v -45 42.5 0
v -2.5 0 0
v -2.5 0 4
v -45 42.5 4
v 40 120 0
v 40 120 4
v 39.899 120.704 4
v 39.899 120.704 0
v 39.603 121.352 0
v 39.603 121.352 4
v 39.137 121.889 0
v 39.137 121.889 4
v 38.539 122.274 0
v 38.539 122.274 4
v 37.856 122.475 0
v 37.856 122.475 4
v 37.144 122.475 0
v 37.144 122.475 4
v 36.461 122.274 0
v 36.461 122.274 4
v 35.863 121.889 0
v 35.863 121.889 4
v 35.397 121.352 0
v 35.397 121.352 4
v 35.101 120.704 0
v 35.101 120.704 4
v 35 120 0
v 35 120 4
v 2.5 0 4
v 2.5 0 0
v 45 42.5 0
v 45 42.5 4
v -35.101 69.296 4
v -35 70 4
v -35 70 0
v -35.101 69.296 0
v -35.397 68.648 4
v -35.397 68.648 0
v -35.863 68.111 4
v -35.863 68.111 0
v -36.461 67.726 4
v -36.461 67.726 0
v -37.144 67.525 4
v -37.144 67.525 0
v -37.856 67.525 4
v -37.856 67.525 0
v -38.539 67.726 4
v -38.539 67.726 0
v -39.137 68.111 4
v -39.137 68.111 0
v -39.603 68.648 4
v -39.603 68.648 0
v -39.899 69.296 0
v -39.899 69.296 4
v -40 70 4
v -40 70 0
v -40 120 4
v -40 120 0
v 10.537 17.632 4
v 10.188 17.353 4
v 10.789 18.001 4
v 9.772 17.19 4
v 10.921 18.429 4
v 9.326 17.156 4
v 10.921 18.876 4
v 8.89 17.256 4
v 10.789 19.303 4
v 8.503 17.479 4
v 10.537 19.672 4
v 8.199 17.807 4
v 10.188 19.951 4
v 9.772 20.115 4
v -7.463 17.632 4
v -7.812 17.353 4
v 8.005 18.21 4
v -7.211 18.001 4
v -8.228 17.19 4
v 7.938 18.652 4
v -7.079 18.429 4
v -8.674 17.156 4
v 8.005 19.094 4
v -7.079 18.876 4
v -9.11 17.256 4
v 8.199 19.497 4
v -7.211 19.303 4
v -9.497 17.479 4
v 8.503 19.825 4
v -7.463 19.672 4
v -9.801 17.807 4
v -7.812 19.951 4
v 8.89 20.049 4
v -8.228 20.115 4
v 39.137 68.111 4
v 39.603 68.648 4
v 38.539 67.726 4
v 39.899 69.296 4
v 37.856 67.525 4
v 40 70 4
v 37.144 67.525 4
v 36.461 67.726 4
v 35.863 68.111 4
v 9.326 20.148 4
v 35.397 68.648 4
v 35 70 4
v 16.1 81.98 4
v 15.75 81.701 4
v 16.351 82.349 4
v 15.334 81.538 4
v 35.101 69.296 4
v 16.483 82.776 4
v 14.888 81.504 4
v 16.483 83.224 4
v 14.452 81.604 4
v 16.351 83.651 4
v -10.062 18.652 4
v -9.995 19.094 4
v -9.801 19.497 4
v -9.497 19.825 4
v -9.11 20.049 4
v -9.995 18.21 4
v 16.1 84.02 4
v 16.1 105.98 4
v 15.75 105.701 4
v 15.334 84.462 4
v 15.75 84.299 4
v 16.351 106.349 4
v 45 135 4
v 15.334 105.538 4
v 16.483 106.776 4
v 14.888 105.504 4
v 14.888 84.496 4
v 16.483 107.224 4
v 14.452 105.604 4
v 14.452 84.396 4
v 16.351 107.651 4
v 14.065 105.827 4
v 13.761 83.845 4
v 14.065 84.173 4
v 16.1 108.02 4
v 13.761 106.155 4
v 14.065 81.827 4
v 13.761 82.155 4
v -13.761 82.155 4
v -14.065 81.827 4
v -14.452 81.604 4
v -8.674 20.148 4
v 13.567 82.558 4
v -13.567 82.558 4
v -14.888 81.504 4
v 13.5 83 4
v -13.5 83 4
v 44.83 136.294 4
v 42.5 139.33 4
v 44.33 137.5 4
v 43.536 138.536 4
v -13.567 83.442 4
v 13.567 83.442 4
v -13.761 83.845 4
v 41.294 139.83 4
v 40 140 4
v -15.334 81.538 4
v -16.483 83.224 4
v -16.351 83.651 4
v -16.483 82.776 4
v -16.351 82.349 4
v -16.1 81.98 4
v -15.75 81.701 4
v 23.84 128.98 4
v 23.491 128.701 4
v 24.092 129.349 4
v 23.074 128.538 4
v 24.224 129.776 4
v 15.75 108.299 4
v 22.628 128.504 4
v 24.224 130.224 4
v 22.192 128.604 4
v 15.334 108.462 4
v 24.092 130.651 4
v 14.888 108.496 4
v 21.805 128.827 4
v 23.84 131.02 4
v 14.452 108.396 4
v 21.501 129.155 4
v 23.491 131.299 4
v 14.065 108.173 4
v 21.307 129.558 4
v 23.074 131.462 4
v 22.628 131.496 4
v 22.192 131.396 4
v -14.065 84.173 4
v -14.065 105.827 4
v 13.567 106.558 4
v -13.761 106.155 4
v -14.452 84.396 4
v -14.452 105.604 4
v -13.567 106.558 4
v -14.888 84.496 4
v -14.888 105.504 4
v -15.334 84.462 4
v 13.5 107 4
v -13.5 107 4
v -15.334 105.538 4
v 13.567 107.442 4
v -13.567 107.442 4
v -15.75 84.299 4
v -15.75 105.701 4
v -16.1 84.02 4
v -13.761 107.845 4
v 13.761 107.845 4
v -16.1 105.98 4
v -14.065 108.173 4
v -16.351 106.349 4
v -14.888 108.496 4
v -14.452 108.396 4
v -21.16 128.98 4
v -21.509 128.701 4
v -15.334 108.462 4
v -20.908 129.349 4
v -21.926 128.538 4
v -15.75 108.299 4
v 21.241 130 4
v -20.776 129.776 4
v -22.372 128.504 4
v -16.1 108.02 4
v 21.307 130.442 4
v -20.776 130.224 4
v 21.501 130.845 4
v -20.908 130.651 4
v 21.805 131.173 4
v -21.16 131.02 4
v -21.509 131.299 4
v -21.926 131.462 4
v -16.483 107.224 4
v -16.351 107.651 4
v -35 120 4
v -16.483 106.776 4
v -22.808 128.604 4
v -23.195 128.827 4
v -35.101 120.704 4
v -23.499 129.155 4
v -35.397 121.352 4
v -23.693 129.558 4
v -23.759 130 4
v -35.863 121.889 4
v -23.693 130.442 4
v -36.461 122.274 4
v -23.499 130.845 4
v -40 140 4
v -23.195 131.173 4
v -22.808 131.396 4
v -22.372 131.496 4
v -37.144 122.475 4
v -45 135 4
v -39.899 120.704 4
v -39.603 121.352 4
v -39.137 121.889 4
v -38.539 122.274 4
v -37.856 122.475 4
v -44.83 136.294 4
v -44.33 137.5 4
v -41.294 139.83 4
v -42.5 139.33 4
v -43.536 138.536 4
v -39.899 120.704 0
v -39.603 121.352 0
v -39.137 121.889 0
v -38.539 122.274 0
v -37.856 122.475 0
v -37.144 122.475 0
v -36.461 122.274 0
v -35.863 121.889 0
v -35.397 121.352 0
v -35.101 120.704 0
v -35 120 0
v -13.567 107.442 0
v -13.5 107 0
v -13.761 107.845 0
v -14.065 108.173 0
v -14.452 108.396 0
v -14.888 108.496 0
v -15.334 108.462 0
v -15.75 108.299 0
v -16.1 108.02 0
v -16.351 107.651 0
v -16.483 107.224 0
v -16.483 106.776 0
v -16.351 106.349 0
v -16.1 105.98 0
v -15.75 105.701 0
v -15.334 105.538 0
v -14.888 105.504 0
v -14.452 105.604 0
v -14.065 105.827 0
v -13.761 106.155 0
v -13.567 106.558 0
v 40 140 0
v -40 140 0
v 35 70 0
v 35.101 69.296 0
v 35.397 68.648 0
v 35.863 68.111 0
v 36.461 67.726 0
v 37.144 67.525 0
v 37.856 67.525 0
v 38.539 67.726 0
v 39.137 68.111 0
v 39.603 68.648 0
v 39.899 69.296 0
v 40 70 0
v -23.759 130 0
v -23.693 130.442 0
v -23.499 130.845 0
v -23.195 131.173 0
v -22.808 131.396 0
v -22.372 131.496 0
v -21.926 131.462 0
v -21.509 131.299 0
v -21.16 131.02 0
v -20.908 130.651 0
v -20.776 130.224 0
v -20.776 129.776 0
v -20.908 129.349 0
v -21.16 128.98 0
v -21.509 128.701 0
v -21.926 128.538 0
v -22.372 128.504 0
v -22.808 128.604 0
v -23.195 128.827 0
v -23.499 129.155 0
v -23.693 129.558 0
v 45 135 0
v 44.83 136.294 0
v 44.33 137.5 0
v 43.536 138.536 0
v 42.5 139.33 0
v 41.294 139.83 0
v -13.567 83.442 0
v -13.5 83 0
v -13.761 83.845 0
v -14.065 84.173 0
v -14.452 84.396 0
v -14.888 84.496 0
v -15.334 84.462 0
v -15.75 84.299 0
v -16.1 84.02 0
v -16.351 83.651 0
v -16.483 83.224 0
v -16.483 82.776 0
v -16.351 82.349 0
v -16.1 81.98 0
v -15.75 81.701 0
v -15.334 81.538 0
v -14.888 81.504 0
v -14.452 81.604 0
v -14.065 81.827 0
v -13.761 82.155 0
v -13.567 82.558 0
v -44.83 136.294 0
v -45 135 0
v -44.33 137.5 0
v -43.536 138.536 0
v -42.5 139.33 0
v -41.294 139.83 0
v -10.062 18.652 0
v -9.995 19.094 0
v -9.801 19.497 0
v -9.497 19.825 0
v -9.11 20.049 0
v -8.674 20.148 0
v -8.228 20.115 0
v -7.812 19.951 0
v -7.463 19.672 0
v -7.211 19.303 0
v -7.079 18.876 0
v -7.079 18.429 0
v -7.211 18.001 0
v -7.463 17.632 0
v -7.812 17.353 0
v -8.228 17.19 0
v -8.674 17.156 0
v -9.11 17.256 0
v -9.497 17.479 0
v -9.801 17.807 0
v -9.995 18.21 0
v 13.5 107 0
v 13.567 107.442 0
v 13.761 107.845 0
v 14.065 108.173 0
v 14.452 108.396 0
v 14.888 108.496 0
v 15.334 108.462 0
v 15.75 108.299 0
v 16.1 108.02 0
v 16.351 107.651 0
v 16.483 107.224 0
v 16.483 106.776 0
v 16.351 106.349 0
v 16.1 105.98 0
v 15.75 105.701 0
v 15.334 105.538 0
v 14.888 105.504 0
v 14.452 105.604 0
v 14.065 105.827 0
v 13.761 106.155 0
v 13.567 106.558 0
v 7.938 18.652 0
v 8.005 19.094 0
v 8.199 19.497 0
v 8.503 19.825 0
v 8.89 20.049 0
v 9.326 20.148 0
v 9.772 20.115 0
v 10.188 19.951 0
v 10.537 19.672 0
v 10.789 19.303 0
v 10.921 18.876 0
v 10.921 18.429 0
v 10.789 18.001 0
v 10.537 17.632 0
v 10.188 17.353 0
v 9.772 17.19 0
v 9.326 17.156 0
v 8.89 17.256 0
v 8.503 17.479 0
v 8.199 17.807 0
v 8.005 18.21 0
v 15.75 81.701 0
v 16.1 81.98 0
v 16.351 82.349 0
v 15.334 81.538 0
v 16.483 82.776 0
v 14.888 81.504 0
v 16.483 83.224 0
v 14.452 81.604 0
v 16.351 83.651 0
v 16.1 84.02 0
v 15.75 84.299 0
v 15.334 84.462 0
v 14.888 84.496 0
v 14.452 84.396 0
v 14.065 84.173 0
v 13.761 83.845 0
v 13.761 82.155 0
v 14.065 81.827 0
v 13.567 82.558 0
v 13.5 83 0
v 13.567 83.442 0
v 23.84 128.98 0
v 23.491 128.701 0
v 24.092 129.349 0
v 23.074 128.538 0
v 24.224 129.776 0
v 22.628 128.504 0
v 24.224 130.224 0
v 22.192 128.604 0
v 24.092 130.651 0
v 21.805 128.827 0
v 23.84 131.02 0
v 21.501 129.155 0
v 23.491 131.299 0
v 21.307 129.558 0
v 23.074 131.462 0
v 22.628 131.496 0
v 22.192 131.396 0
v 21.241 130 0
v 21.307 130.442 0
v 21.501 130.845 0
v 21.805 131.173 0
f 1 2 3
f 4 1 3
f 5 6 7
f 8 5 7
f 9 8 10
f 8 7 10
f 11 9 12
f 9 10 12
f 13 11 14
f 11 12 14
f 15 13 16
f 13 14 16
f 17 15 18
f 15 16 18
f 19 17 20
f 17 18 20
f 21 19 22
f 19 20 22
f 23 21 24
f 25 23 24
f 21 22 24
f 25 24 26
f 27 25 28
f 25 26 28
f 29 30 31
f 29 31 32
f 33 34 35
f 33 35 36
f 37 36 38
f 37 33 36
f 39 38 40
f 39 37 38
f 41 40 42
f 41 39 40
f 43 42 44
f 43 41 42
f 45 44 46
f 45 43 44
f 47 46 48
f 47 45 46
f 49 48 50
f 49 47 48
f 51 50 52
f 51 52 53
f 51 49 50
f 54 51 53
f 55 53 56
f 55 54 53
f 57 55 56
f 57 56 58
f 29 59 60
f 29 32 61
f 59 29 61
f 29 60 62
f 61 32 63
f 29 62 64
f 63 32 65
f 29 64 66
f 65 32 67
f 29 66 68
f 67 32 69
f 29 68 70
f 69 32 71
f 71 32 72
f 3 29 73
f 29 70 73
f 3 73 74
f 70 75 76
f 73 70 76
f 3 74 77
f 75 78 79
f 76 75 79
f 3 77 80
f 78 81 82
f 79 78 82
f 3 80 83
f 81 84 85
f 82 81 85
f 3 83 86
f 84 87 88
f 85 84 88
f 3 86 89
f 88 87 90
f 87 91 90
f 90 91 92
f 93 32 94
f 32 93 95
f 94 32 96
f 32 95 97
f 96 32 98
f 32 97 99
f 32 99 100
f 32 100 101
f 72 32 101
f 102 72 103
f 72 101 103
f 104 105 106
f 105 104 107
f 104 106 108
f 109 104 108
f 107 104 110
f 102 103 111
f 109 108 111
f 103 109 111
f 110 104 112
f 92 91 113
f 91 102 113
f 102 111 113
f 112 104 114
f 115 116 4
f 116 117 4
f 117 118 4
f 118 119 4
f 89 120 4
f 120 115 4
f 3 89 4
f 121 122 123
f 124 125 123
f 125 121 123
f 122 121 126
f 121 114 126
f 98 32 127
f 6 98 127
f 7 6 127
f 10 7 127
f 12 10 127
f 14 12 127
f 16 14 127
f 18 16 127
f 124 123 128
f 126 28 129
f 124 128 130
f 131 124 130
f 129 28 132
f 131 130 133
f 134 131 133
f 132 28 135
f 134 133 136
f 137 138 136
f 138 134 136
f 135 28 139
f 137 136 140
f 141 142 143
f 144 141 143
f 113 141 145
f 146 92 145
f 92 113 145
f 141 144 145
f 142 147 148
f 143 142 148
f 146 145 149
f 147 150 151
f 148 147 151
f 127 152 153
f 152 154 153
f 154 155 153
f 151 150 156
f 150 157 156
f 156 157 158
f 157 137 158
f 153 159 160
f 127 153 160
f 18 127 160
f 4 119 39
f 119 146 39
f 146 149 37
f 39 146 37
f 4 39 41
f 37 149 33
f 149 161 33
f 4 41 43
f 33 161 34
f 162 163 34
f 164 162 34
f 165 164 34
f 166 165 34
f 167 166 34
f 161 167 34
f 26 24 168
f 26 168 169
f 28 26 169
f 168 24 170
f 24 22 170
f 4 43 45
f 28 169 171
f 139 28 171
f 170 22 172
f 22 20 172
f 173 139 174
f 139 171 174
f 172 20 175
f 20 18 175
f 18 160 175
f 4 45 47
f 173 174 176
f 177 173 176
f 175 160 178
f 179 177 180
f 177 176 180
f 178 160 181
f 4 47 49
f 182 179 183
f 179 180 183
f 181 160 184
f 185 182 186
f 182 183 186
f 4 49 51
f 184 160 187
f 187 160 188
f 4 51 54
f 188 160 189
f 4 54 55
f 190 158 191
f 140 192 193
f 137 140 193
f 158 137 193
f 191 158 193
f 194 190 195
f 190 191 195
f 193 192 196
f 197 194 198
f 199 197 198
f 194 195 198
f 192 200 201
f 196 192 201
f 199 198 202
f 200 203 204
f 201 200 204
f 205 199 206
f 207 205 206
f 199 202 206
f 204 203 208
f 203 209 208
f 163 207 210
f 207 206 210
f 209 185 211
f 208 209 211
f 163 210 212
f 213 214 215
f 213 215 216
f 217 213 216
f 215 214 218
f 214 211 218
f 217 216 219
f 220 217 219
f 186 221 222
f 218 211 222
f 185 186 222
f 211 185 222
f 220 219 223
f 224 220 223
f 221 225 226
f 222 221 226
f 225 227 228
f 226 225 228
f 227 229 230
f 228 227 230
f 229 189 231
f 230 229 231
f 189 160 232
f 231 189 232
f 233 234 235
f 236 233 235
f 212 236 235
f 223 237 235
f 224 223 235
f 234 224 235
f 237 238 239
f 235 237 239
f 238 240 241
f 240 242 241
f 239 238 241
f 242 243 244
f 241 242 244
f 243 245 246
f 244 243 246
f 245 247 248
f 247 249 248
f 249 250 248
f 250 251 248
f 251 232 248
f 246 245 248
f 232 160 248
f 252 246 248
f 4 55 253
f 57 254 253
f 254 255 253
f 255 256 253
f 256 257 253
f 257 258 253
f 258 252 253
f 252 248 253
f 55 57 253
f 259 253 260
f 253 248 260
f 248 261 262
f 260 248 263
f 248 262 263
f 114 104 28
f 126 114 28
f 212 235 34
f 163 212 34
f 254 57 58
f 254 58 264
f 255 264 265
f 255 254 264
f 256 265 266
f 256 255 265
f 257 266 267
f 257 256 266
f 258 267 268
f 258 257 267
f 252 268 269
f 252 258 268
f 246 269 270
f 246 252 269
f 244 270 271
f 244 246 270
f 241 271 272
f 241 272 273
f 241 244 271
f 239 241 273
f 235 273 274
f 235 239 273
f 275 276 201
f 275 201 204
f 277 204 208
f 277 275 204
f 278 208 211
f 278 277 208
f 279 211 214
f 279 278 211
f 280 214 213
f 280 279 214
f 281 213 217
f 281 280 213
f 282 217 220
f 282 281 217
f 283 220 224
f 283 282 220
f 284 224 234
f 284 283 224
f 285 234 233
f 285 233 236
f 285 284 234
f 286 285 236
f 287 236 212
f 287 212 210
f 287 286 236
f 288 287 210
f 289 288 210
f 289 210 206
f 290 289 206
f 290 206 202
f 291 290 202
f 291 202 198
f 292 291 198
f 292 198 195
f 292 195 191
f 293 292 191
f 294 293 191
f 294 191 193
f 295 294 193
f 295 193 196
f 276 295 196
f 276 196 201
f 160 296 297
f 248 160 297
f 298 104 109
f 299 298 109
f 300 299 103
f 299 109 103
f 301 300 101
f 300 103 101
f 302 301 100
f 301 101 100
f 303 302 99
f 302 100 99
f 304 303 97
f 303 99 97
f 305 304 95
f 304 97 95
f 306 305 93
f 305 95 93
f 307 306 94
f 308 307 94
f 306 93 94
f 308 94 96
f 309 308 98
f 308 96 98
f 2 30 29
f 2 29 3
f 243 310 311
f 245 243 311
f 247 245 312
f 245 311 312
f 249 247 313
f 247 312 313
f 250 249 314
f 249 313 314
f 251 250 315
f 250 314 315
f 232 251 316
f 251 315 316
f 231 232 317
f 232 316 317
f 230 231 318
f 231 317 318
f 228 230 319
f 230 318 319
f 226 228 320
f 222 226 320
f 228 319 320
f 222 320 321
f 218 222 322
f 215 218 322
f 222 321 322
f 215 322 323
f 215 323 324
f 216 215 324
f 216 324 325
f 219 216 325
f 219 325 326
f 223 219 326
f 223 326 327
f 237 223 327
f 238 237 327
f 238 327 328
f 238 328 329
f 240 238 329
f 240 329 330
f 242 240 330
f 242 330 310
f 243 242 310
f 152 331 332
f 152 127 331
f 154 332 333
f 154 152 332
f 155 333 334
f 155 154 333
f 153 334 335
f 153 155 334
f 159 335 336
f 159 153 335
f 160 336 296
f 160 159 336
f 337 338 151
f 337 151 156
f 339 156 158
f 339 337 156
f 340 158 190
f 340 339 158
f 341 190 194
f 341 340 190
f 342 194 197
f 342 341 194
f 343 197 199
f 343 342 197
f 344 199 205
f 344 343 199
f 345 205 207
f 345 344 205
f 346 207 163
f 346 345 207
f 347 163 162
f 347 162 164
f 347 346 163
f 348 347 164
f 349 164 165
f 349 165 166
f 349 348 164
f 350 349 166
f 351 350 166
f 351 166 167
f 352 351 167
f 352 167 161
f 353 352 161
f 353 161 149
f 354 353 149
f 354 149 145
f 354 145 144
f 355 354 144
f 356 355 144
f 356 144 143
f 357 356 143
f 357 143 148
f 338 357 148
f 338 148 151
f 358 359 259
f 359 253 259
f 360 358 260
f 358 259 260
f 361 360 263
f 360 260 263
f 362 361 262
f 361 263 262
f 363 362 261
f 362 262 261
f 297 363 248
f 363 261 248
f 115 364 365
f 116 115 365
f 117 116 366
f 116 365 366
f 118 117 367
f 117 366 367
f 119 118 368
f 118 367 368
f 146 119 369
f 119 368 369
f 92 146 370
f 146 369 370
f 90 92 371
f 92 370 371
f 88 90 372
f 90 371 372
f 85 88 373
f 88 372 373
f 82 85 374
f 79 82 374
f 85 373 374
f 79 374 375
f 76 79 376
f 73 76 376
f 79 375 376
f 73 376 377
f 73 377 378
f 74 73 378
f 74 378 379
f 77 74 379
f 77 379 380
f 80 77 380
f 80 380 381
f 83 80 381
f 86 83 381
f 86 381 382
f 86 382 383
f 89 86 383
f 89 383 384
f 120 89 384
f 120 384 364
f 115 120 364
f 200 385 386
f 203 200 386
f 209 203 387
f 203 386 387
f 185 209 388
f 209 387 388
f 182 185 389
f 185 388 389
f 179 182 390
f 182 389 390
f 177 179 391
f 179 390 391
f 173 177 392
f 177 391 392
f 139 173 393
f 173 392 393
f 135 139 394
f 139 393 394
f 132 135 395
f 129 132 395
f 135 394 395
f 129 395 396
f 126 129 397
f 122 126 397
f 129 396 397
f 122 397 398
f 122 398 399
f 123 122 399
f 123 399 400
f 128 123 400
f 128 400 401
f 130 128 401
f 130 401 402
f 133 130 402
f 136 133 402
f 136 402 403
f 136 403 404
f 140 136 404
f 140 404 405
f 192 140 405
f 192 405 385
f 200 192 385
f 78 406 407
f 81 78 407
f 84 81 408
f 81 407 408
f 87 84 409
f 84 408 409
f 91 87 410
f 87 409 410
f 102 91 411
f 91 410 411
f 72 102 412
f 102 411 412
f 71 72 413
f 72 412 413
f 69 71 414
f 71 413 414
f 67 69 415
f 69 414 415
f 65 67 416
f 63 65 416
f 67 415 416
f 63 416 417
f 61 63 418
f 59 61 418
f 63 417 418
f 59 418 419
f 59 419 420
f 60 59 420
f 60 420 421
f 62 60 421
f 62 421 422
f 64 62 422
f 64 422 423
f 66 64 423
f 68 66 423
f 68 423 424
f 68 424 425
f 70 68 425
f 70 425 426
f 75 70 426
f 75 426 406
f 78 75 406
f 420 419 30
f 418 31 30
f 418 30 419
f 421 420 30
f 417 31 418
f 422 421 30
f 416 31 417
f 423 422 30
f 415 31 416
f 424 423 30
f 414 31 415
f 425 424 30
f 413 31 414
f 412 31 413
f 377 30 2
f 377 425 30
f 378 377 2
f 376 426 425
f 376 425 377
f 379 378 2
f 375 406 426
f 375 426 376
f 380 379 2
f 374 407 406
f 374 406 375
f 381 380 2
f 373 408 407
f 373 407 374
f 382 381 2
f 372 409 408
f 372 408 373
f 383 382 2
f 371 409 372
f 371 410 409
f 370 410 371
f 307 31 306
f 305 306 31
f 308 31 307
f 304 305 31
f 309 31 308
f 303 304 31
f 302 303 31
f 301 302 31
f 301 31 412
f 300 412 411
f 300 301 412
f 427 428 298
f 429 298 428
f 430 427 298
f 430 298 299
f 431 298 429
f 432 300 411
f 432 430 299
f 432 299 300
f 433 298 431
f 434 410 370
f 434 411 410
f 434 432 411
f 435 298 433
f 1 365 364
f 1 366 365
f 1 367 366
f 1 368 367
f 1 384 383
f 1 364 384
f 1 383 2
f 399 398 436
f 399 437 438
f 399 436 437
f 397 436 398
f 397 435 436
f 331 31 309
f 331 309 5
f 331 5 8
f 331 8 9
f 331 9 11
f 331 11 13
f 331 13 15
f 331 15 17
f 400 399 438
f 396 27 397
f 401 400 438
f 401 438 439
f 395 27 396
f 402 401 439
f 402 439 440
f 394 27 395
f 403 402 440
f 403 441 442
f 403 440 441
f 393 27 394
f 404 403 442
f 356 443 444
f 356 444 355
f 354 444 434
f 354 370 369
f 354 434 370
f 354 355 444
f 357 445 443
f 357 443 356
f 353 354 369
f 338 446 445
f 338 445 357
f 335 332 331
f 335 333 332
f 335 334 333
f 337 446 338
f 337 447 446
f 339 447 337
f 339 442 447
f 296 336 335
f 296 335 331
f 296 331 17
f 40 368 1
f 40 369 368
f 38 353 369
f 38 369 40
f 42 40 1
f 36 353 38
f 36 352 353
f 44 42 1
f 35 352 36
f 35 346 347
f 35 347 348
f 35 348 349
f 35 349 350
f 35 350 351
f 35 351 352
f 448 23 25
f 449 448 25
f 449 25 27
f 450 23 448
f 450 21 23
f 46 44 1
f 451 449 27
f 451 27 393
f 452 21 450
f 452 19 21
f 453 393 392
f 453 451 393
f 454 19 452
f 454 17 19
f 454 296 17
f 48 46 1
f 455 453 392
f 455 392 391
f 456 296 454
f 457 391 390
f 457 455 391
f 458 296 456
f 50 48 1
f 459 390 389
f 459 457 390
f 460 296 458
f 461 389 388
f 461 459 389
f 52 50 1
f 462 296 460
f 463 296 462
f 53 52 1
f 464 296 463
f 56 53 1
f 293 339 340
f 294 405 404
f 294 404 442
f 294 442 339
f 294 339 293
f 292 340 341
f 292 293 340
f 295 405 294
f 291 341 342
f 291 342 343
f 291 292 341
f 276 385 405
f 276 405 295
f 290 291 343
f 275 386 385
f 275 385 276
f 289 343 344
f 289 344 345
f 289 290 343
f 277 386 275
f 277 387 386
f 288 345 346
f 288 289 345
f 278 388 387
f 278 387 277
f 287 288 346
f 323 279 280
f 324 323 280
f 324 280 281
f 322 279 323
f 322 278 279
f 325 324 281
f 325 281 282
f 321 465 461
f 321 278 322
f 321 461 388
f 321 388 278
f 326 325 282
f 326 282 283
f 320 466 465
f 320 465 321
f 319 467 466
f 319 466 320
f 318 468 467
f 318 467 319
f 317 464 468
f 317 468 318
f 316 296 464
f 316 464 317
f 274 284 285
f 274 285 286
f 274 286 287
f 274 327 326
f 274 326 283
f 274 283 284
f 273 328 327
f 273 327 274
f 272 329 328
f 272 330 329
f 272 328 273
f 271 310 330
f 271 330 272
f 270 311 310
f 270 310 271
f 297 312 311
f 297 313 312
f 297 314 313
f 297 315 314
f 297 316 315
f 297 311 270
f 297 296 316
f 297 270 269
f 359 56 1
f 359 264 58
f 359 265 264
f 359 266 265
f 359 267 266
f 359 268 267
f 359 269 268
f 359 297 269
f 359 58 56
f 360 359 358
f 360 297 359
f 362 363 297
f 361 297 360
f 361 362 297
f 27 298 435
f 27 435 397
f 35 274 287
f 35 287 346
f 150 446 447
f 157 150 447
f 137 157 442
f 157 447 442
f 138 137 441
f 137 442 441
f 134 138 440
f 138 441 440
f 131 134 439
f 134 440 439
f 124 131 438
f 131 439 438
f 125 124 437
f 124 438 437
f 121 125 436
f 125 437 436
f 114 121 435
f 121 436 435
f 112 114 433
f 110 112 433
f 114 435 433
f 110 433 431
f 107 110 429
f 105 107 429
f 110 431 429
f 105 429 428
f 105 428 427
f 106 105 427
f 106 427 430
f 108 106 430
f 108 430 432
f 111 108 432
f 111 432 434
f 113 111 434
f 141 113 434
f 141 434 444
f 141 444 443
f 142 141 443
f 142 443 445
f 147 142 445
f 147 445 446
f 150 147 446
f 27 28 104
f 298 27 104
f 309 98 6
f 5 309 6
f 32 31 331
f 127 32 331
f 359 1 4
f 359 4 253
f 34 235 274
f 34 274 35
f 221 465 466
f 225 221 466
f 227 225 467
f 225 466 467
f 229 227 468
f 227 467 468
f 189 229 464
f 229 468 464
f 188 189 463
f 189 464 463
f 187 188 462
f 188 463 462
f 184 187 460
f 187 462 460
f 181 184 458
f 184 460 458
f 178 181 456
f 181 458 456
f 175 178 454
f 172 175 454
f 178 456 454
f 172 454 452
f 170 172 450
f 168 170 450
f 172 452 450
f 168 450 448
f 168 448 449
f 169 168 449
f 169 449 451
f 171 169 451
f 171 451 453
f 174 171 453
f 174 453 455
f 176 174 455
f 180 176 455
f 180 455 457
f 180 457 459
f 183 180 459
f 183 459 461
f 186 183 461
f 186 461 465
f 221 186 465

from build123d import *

# Parameters (mm, degrees)
F0_W     = 45
F0_H     = 140
F1_DEPTH = 4
F2_R     = 5
F3_SIZE  = 42.5
F5_D     = 3
F8_DEPTH = 60.96641
F11_D    = 3
F13_D    = 3


with BuildPart() as f1:
    # F0 (on Top) → F1 (new body)
    with BuildSketch(Plane.XY):
        with Locations((22.5, 70)):
            Rectangle(F0_W, F0_H)
    extrude(amount=F1_DEPTH)

    # F2
    f2_edges = [f1.edges().sort_by_distance(p)[0] for p in [
        (45, 140, 2),
    ]]
    fillet(f2_edges, radius=F2_R)

    # F3
    f3_edges = [f1.edges().sort_by_distance(p)[0] for p in [
        (45, 0, 2),
    ]]
    chamfer(f3_edges, length=F3_SIZE)

    # F5 (through all)
    with Locations(Plane.XY.offset(4)):
        with Locations((15, 107), (15, 83)):
            Hole(F5_D / 2)

    # F7 (on face) → F8 (cut)
    with BuildSketch(Plane.XY.offset(4)):
        with BuildLine():
            ThreePointArc((35, 70), (37.5, 67.5), (40, 70))
            Line((40, 70), (40, 120))
            ThreePointArc((40, 120), (37.5, 122.5), (35, 120))
            Line((35, 120), (35, 70))
        make_face()
    extrude(amount=-F8_DEPTH, mode=Mode.SUBTRACT)

    # F9: F1 across plane


with BuildPart() as f1_1:
    add(f1.part)
    add(f1.part.mirror(Plane.YZ))

    # F11 (through all)
    with Locations(Plane.XY.offset(4)):
        with Locations((-22.259496, 130), (22.740504, 130)):
            Hole(F11_D / 2)

    # F13 (through all)
    with Locations(Plane.XY.offset(4)):
        with Locations((-8.5621, 18.652199), (9.4379, 18.652199)):
            Hole(F13_D / 2)


solid = f1_1.part
